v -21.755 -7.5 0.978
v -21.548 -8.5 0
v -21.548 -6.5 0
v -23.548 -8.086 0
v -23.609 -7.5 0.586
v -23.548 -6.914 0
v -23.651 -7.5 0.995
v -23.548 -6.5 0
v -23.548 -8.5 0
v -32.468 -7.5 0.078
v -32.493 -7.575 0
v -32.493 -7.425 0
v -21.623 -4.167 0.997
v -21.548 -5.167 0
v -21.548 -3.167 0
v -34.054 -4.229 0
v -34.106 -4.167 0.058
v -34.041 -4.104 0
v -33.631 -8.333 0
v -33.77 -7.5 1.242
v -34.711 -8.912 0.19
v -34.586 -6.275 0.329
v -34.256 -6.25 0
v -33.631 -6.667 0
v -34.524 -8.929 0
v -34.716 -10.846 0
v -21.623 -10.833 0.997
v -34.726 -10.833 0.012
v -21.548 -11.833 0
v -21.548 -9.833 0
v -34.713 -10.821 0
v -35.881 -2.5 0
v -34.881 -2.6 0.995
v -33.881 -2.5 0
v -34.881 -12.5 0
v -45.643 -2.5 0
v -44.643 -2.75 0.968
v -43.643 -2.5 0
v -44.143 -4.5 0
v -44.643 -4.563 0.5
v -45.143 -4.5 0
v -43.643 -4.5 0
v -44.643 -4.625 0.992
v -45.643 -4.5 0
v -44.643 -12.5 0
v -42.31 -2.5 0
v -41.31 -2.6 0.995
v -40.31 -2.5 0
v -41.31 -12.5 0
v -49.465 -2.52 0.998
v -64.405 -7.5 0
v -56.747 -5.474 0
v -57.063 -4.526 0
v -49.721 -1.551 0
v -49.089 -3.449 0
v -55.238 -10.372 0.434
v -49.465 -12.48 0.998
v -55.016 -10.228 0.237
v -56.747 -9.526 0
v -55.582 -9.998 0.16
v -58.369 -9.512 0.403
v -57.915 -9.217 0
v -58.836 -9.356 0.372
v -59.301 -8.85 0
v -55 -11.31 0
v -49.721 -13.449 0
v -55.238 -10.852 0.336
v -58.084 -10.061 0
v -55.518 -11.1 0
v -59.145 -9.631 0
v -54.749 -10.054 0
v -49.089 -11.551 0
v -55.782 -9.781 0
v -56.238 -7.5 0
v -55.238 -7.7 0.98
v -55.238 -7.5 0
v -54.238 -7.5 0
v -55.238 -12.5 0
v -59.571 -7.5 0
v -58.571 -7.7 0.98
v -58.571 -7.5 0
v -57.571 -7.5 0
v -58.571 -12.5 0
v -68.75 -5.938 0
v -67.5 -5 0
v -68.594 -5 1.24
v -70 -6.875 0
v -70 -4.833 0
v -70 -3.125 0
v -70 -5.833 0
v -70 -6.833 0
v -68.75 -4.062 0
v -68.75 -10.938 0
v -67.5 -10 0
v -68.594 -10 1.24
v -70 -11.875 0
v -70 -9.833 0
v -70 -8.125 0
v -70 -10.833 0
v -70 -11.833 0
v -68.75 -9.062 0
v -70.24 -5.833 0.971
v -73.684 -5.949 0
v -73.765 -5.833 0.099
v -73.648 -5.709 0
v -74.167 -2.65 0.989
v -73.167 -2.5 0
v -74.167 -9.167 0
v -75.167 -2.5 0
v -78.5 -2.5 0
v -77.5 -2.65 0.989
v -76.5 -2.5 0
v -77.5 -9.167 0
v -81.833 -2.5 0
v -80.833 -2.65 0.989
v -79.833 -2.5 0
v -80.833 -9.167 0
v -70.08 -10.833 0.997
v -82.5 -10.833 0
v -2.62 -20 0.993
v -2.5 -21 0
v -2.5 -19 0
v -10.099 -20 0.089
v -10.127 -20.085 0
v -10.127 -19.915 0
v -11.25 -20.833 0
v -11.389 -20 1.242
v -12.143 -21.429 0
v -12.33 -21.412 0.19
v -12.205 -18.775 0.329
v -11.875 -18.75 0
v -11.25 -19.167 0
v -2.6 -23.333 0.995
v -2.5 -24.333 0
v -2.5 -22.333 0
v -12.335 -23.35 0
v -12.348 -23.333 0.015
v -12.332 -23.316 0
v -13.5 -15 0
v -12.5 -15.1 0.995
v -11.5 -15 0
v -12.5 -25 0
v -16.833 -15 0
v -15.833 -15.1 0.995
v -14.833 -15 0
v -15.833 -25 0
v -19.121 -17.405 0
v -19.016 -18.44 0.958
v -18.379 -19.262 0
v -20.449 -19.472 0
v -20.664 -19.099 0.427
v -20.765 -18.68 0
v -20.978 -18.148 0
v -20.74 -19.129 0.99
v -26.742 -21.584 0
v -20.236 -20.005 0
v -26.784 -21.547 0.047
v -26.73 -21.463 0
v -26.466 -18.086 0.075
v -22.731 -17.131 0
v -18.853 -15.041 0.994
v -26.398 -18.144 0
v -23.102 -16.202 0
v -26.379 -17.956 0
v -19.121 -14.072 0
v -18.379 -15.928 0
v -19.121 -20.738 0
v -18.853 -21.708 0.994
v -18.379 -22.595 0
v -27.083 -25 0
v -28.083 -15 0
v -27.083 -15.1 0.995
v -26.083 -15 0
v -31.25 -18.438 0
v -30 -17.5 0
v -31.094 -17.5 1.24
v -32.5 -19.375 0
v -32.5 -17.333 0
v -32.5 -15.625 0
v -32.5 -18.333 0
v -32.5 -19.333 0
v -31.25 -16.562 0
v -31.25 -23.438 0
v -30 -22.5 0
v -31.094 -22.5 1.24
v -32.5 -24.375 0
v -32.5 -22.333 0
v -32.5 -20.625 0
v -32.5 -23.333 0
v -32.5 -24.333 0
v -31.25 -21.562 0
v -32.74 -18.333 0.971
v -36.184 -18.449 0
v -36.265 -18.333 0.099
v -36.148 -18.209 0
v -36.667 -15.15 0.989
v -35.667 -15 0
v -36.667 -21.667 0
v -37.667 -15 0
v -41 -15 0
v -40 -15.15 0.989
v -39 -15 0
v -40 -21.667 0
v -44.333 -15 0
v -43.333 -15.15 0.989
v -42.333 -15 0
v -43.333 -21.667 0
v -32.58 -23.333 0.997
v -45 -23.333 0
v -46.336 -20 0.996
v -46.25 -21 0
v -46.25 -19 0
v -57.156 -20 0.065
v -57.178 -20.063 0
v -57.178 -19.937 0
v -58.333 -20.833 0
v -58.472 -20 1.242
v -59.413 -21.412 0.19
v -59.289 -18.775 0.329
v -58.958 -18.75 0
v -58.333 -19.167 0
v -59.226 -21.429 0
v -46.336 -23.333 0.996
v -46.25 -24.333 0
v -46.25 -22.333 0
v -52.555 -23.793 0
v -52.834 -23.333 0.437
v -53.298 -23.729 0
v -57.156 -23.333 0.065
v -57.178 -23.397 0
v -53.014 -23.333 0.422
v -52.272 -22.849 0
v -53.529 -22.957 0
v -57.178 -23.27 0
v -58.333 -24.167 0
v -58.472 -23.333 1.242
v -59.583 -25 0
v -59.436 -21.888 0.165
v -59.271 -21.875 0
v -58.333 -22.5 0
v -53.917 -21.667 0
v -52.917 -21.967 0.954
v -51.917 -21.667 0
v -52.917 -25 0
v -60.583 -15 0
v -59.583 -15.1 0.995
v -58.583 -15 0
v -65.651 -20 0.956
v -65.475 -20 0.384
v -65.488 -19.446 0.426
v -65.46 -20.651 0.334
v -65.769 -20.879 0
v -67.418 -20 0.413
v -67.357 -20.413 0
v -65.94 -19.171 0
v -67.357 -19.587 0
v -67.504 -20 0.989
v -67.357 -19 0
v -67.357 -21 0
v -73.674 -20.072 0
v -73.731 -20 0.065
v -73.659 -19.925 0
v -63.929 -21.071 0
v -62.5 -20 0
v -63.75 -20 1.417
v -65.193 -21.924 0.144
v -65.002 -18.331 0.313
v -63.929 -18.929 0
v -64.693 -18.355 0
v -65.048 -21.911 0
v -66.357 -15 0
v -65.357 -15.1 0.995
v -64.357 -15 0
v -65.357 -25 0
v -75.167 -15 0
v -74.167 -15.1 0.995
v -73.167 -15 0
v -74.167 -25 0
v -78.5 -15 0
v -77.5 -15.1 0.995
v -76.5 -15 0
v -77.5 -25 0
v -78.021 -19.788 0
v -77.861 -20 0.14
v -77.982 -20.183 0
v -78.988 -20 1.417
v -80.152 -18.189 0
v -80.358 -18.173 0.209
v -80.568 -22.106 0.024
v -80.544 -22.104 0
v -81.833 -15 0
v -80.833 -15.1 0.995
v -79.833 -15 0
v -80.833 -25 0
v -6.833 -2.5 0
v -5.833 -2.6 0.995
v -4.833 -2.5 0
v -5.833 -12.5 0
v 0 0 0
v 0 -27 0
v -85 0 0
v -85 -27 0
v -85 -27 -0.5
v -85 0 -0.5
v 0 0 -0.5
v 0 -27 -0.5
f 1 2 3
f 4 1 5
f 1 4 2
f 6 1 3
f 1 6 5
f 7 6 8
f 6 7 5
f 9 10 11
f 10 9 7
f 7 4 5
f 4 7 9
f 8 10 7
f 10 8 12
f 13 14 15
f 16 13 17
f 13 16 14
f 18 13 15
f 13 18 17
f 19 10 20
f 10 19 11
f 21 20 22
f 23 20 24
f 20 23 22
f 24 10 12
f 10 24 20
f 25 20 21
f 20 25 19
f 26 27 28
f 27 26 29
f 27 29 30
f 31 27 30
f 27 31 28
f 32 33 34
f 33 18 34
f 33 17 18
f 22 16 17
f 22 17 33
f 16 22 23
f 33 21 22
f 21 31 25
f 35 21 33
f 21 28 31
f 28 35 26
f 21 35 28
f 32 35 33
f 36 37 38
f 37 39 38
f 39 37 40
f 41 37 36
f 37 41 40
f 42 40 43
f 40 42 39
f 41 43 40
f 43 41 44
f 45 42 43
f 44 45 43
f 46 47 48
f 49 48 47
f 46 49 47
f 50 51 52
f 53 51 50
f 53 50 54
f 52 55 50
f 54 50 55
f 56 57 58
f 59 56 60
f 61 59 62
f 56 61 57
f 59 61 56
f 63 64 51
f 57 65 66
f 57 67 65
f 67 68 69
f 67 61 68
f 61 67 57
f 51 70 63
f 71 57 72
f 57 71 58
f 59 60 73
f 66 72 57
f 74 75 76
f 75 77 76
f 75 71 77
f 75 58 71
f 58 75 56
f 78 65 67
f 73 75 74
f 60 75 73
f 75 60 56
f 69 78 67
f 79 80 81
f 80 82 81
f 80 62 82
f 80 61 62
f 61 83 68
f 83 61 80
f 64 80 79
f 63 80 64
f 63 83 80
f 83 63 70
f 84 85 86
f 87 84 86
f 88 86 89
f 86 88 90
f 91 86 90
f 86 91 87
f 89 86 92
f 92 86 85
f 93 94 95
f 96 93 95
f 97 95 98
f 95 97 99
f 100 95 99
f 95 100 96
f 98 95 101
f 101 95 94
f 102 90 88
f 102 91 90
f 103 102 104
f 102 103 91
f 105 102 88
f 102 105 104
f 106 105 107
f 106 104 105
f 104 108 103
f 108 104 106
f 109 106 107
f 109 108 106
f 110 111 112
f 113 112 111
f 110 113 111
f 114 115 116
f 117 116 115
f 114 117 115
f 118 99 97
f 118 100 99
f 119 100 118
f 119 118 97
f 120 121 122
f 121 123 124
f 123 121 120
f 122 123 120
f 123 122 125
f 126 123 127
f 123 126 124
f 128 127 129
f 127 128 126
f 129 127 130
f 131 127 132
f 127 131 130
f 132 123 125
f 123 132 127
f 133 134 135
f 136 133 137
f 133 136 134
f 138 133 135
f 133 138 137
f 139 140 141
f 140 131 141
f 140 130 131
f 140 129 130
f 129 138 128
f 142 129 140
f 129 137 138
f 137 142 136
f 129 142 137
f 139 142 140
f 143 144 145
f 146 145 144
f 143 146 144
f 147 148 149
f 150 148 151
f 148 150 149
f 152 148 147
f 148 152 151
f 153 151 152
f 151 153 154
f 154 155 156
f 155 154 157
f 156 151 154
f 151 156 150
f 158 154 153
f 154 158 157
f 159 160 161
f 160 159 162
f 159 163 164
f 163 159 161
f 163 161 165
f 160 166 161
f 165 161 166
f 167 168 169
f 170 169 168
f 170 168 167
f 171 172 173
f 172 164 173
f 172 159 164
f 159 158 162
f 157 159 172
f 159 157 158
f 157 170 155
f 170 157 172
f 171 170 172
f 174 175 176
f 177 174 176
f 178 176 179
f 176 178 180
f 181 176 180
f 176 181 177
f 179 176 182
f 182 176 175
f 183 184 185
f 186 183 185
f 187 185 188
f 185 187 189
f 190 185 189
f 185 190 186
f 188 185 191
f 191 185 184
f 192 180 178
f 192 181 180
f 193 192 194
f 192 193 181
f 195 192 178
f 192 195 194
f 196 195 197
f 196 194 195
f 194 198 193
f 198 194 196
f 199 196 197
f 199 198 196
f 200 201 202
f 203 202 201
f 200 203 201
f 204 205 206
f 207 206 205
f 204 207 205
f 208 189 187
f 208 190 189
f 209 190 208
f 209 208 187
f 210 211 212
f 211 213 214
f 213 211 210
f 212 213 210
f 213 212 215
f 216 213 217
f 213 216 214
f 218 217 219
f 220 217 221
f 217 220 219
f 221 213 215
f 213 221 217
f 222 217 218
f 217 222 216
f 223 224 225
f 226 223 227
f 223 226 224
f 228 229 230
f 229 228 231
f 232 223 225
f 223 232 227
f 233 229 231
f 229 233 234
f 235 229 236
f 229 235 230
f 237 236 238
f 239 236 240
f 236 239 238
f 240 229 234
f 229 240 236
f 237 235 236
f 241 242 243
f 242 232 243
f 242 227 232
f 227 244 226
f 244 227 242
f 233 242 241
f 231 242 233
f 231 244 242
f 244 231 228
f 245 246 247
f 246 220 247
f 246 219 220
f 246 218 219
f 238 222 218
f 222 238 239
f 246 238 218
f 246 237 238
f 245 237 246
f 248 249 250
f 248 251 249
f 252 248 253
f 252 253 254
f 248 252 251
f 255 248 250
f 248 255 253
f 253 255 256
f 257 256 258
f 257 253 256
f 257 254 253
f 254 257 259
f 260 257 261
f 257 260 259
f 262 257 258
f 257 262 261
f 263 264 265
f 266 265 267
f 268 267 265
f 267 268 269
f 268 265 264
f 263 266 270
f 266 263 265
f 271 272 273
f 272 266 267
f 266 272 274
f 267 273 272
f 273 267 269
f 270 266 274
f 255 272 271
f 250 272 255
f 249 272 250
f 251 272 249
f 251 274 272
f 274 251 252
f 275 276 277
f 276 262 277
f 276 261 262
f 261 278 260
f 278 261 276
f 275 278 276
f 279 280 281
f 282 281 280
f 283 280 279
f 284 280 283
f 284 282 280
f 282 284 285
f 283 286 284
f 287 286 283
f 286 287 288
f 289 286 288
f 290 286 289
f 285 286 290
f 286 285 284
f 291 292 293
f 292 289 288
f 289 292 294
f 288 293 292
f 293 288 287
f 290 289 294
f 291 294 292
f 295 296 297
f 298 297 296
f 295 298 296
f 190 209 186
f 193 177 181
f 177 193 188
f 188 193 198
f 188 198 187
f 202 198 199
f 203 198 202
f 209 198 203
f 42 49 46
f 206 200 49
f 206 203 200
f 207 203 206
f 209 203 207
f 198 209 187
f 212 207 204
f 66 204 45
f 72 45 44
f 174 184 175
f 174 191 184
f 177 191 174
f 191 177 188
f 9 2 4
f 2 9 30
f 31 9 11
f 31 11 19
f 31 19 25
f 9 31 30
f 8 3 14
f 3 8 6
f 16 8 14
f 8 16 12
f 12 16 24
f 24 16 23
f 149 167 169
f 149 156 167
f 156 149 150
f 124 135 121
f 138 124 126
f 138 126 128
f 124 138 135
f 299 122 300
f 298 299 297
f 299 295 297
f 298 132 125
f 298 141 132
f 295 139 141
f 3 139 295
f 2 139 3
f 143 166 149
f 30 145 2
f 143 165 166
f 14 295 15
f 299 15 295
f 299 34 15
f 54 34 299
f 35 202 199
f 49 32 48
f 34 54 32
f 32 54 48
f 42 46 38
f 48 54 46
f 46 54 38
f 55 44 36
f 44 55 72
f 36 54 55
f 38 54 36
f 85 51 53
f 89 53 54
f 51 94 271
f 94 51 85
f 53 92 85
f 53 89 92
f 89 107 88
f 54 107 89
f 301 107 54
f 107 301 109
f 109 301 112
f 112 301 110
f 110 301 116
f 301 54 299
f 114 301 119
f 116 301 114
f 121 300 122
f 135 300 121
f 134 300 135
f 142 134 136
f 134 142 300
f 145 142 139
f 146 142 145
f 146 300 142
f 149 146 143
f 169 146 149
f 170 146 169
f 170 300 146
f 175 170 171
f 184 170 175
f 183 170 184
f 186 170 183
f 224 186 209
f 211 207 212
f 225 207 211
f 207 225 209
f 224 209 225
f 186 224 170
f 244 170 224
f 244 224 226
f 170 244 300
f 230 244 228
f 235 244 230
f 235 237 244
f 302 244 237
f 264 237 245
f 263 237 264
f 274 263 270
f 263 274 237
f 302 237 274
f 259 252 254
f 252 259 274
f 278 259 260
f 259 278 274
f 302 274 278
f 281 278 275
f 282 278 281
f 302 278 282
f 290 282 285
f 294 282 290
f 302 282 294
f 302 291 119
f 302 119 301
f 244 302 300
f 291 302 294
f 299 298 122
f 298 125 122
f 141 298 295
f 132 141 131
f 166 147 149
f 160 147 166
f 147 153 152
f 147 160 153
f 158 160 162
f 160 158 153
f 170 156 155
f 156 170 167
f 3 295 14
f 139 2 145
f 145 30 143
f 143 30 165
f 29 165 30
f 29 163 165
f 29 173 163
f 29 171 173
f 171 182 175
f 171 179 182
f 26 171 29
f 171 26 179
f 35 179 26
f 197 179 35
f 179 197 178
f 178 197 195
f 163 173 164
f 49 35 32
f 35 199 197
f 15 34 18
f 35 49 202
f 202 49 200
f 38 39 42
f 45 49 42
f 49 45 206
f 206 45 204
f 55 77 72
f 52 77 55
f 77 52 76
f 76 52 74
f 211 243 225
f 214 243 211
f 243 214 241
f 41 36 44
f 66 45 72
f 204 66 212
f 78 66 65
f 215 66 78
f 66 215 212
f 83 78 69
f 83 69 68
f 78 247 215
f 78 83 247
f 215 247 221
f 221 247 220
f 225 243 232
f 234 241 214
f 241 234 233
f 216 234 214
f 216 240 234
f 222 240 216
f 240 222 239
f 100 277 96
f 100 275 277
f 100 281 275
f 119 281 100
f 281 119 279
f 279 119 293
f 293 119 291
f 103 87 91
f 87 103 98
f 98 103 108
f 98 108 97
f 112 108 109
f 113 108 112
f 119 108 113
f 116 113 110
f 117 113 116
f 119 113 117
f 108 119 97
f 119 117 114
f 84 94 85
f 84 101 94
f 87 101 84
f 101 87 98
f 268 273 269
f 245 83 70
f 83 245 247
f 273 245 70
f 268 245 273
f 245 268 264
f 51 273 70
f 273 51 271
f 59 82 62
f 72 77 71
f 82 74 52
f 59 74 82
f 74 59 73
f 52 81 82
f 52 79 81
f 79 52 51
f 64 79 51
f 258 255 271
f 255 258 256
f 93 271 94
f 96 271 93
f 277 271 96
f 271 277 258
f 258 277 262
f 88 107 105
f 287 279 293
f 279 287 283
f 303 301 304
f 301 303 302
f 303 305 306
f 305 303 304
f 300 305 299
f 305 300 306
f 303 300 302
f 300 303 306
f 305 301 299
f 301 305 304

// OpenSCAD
// file: cuneiform.scad
MAX_STROKE_WIDTH = 1/5;

module wedge(x, y, z, w, h, phi, o=false){
	// o is for offset, an experiment with moving the stroke so that its greatest depth would be at the origin point
	// It's not working very well; just don't use it for now
	// Also need to extend the stroke by delta if we do that
	
	s = w / sqrt(2);
	d = w / 2; // Depth of stroke, from head to deepest point
	l = sqrt(h*h - d*d); // Length of stroke, from deepest point to tip
	theta = atan(d/l); // Angle of stylus
	delta = o ? d*sin(theta) : 0; // Horizontal distance from head of wedge to greatest depth

	translate([x, y, z])
	rotate([0, 0, phi])
	translate([-delta, 0, 0])
	rotate([0, -theta, 0])
	rotate([45, 0, 0])
	translate([0, -s/2, -s/2])
	cube([l, s, s]);
}

module haken(x, y, z, s, d){
	w = s*sqrt(2);
	theta = atan(d/(w/2));
	translate([x, y, z])
	rotate([0, -theta, 0])
	translate([0, 0, -d])
	rotate([0, 0, -45])
	cube([s, s, d]);
}

module singlestroke(x, y, w, h){ // Vertical, positioned from top left corner
	w2 = min(h, w, MAX_STROKE_WIDTH);
	wedge(x+w/2, y, 0, w2, h, 90);
}

module doublestroke(x, y, w, h){
	w2 = min(h, w, MAX_STROKE_WIDTH);
	dist = min(w2, h/4);
	h2 = h - dist;
	h3 = h2 / 2;
	wedge(x+w/2, y, 0, w2, h3, 90);
	wedge(x+w/2, y+dist, 0, w2, h2, 90);
}

module triplestroke(x, y, w, h){
	w2 = min(h, w, MAX_STROKE_WIDTH);
	dist = min(w2, h/4);
	h2 = h - dist*2;
	h3 = min(h2/2, h-dist*2);
	wedge(x+w/2, y, 0, w2, h3, 90);
	wedge(x+w/2, y+dist, 0, w2, h3, 90);
	wedge(x+w/2, y+dist*2, 0, w2, h2, 90);
}

module hookstroke(x, y, w, h, factor=0.75){
//	hh = (w-h/2<0.0001) ? factor*h : h; // By default, the renderer produces hakens that are twice as tall as they are wide - but that means d = 0!
	// We fix this by reducing h by a factor < 1, when this happens
	// Comparing against epsilon instead of zero because transferring numbers from Python to SCAD can do weird things occasionally
	// Experiment: changing w instead of h to make hakens wider, which makes them more visible when they're pressed against verticals
	// Experiment undone - it works better changing h and having an adjustment in the renderer for when it's pressed against a vertical
//	ww = (w-h/2<0.0001) ? w/factor : w;
	ww = w;
	hh = (w-h/2<0.0001) ? h*factor : h;
	s = hh / sqrt(2);
	d = sqrt(ww*ww - hh*hh/4);
	deltaw = (ww-w);
	haken(x-deltaw, y+h/2, 0, s, d); // Use h instead of hh because the haken() module wants the position of the tip, and that needs to be at the midpoint of the *original* bounding box
}

module hrule(y, w, h=0.05){
	s = h*sqrt(2)/2;
	translate([0, y, -s])
		rotate([45, 0, 0])
			cube([w, h, h]);
}

module hatcharea(x, y, w, h){
	// TODO
}
// main file
use <cuneiform.scad>

scale([1,-1,1]){
	rotate([0,180,0]){
		union(){
			cube([85,27,0.5]);
			difference(){
				union(){
					translate([2.5,2.5,0]){
						scale([10.0,10.0,10.0]){
							translate([0,0,0]){
								singlestroke(0.16666666666666666, 0, 0.3333333333333333, 1);
							}
							translate([1.9047619047619047,0,0]){
								rotate(-90.0){
									singlestroke(-0.3333333333333333, 0, 0.3333333333333333, 1.3333333333333333);
								}
								rotate(-90.0){
									doublestroke(-0.6666666666666666, 0, 0.3333333333333333, 1.1666666666666665);
								}
								hookstroke(1.0833333333333333, 0.3333333333333333, 0.25, 0.3333333333333333);
								rotate(-90.0){
									singlestroke(-1.0, 0, 0.3333333333333333, 1.3333333333333333);
								}
								singlestroke(1.1666666666666665, 0, 0.3333333333333333, 1);
							}
							translate([3.7142857142857144,0,0]){
								singlestroke(0.0, 0, 0.3333333333333333, 1);
								doublestroke(0.3333333333333333, 0, 0.3333333333333333, 1);
							}
							translate([4.690476190476191,0,0]){
								translate([0,0.0,0]){
									rotate(-71.56505117707799){
										translate([-0.16666666666666666,0,0]){
											singlestroke(0, 0, 0.3333333333333333, 1.5811388300841898);
										}
									}
								}
								translate([0,0.5,0]){
									scale([1,-1,1]){
										translate([0,-0.5,0]){
											translate([0,0,0]){
												rotate(-71.56505117707799){
													translate([-0.16666666666666666,0,0]){
														singlestroke(0, 0, 0.3333333333333333, 1.5811388300841898);
													}
												}
											}
										}
									}
								}
								singlestroke(0.41666666666666674, 0.5, 0.3333333333333333, 0.5);
								singlestroke(0.7500000000000001, 0.5, 0.3333333333333333, 0.5);
							}
							translate([6.5,0,0]){
								hookstroke(0.0, 0.0, 0.25, 0.5);
								hookstroke(0.0, 0.5, 0.25, 0.5);
								rotate(-90.0){
									singlestroke(-0.5, 0.25, 0.3333333333333333, 0.41666666666666674);
								}
								singlestroke(0.5000000000000001, 0, 0.3333333333333333, 0.6666666666666667);
								singlestroke(0.8333333333333335, 0, 0.3333333333333333, 0.6666666666666667);
								singlestroke(1.1666666666666667, 0, 0.3333333333333333, 0.6666666666666667);
								rotate(-90.0){
									singlestroke(-1.0, 0.25, 0.3333333333333333, 1.25);
								}
							}
							translate([0,1.25,0]){
								rotate(-90.0){
									singlestroke(-0.6666666666666666, 0, 0.3333333333333333, 0.8333333333333334);
								}
								hookstroke(0.7500000000000001, 0.3333333333333333, 0.25, 0.3333333333333333);
								rotate(-90.0){
									singlestroke(-1.0, 0, 0.3333333333333333, 1.0);
								}
								singlestroke(0.8333333333333334, 0, 0.3333333333333333, 1);
								singlestroke(1.1666666666666665, 0, 0.3333333333333333, 1);
							}
							translate([1.625,1.25,0]){
								translate([0,0.0,0]){
									rotate(-68.19859051364818){
										translate([-0.16666666666666666,0,0]){
											singlestroke(0, 0, 0.3333333333333333, 0.8975274678557505);
										}
									}
								}
								translate([0,0.3333333333333333,0]){
									rotate(-68.19859051364818){
										translate([-0.16666666666666666,0,0]){
											doublestroke(0, 0, 0.3333333333333333, 0.8975274678557505);
										}
									}
								}
								translate([0,0.6666666666666666,0]){
									rotate(-68.19859051364818){
										translate([-0.16666666666666666,0,0]){
											singlestroke(0, 0, 0.3333333333333333, 0.8975274678557505);
										}
									}
								}
								singlestroke(0.6666666666666666, 0, 0.3333333333333333, 1);
							}
							translate([2.75,1.25,0]){
								hookstroke(0.0, 0.0, 0.25, 0.5);
								hookstroke(0.0, 0.5, 0.25, 0.5);
								rotate(-90.0){
									singlestroke(-0.5, 0.25, 0.3333333333333333, 0.41666666666666674);
								}
								singlestroke(0.5000000000000001, 0, 0.3333333333333333, 0.6666666666666667);
								singlestroke(0.8333333333333335, 0, 0.3333333333333333, 0.6666666666666667);
								singlestroke(1.1666666666666667, 0, 0.3333333333333333, 0.6666666666666667);
								rotate(-90.0){
									singlestroke(-1.0, 0.25, 0.3333333333333333, 1.25);
								}
							}
							translate([4.375,1.25,0]){
								rotate(-90.0){
									singlestroke(-0.6666666666666666, 0, 0.3333333333333333, 1.1666666666666665);
								}
								hookstroke(1.0833333333333333, 0.3333333333333333, 0.25, 0.3333333333333333);
								rotate(-90.0){
									singlestroke(-1.0, 0, 0.3333333333333333, 1.1666666666666665);
								}
								hookstroke(1.0833333333333333, 0.6666666666666666, 0.25, 0.3333333333333333);
								singlestroke(0.5, 0.6666666666666666, 0.3333333333333333, 0.3333333333333333);
								singlestroke(1.1666666666666665, 0, 0.3333333333333333, 1);
							}
							translate([6.0,1.25,0]){
								hookstroke(0, 0.2142857142857143, 0.2857142857142857, 0.5714285714285714);
								singlestroke(0.11904761904761904, 0, 0.3333333333333333, 1);
								rotate(-90.0){
									doublestroke(-0.6666666666666667, 0.2857142857142857, 0.3333333333333333, 0.880952380952381);
								}
								singlestroke(1.0, 0, 0.3333333333333333, 1);
								singlestroke(1.3333333333333333, 0, 0.3333333333333333, 1);
								hookstroke(1.5238095238095237, 0.2142857142857143, 0.2857142857142857, 0.5714285714285714);
								singlestroke(1.6666666666666665, 0, 0.3333333333333333, 1);
							}
						}
					}
				}
				cube([85,27,100]);
			}
		}
	}
}
